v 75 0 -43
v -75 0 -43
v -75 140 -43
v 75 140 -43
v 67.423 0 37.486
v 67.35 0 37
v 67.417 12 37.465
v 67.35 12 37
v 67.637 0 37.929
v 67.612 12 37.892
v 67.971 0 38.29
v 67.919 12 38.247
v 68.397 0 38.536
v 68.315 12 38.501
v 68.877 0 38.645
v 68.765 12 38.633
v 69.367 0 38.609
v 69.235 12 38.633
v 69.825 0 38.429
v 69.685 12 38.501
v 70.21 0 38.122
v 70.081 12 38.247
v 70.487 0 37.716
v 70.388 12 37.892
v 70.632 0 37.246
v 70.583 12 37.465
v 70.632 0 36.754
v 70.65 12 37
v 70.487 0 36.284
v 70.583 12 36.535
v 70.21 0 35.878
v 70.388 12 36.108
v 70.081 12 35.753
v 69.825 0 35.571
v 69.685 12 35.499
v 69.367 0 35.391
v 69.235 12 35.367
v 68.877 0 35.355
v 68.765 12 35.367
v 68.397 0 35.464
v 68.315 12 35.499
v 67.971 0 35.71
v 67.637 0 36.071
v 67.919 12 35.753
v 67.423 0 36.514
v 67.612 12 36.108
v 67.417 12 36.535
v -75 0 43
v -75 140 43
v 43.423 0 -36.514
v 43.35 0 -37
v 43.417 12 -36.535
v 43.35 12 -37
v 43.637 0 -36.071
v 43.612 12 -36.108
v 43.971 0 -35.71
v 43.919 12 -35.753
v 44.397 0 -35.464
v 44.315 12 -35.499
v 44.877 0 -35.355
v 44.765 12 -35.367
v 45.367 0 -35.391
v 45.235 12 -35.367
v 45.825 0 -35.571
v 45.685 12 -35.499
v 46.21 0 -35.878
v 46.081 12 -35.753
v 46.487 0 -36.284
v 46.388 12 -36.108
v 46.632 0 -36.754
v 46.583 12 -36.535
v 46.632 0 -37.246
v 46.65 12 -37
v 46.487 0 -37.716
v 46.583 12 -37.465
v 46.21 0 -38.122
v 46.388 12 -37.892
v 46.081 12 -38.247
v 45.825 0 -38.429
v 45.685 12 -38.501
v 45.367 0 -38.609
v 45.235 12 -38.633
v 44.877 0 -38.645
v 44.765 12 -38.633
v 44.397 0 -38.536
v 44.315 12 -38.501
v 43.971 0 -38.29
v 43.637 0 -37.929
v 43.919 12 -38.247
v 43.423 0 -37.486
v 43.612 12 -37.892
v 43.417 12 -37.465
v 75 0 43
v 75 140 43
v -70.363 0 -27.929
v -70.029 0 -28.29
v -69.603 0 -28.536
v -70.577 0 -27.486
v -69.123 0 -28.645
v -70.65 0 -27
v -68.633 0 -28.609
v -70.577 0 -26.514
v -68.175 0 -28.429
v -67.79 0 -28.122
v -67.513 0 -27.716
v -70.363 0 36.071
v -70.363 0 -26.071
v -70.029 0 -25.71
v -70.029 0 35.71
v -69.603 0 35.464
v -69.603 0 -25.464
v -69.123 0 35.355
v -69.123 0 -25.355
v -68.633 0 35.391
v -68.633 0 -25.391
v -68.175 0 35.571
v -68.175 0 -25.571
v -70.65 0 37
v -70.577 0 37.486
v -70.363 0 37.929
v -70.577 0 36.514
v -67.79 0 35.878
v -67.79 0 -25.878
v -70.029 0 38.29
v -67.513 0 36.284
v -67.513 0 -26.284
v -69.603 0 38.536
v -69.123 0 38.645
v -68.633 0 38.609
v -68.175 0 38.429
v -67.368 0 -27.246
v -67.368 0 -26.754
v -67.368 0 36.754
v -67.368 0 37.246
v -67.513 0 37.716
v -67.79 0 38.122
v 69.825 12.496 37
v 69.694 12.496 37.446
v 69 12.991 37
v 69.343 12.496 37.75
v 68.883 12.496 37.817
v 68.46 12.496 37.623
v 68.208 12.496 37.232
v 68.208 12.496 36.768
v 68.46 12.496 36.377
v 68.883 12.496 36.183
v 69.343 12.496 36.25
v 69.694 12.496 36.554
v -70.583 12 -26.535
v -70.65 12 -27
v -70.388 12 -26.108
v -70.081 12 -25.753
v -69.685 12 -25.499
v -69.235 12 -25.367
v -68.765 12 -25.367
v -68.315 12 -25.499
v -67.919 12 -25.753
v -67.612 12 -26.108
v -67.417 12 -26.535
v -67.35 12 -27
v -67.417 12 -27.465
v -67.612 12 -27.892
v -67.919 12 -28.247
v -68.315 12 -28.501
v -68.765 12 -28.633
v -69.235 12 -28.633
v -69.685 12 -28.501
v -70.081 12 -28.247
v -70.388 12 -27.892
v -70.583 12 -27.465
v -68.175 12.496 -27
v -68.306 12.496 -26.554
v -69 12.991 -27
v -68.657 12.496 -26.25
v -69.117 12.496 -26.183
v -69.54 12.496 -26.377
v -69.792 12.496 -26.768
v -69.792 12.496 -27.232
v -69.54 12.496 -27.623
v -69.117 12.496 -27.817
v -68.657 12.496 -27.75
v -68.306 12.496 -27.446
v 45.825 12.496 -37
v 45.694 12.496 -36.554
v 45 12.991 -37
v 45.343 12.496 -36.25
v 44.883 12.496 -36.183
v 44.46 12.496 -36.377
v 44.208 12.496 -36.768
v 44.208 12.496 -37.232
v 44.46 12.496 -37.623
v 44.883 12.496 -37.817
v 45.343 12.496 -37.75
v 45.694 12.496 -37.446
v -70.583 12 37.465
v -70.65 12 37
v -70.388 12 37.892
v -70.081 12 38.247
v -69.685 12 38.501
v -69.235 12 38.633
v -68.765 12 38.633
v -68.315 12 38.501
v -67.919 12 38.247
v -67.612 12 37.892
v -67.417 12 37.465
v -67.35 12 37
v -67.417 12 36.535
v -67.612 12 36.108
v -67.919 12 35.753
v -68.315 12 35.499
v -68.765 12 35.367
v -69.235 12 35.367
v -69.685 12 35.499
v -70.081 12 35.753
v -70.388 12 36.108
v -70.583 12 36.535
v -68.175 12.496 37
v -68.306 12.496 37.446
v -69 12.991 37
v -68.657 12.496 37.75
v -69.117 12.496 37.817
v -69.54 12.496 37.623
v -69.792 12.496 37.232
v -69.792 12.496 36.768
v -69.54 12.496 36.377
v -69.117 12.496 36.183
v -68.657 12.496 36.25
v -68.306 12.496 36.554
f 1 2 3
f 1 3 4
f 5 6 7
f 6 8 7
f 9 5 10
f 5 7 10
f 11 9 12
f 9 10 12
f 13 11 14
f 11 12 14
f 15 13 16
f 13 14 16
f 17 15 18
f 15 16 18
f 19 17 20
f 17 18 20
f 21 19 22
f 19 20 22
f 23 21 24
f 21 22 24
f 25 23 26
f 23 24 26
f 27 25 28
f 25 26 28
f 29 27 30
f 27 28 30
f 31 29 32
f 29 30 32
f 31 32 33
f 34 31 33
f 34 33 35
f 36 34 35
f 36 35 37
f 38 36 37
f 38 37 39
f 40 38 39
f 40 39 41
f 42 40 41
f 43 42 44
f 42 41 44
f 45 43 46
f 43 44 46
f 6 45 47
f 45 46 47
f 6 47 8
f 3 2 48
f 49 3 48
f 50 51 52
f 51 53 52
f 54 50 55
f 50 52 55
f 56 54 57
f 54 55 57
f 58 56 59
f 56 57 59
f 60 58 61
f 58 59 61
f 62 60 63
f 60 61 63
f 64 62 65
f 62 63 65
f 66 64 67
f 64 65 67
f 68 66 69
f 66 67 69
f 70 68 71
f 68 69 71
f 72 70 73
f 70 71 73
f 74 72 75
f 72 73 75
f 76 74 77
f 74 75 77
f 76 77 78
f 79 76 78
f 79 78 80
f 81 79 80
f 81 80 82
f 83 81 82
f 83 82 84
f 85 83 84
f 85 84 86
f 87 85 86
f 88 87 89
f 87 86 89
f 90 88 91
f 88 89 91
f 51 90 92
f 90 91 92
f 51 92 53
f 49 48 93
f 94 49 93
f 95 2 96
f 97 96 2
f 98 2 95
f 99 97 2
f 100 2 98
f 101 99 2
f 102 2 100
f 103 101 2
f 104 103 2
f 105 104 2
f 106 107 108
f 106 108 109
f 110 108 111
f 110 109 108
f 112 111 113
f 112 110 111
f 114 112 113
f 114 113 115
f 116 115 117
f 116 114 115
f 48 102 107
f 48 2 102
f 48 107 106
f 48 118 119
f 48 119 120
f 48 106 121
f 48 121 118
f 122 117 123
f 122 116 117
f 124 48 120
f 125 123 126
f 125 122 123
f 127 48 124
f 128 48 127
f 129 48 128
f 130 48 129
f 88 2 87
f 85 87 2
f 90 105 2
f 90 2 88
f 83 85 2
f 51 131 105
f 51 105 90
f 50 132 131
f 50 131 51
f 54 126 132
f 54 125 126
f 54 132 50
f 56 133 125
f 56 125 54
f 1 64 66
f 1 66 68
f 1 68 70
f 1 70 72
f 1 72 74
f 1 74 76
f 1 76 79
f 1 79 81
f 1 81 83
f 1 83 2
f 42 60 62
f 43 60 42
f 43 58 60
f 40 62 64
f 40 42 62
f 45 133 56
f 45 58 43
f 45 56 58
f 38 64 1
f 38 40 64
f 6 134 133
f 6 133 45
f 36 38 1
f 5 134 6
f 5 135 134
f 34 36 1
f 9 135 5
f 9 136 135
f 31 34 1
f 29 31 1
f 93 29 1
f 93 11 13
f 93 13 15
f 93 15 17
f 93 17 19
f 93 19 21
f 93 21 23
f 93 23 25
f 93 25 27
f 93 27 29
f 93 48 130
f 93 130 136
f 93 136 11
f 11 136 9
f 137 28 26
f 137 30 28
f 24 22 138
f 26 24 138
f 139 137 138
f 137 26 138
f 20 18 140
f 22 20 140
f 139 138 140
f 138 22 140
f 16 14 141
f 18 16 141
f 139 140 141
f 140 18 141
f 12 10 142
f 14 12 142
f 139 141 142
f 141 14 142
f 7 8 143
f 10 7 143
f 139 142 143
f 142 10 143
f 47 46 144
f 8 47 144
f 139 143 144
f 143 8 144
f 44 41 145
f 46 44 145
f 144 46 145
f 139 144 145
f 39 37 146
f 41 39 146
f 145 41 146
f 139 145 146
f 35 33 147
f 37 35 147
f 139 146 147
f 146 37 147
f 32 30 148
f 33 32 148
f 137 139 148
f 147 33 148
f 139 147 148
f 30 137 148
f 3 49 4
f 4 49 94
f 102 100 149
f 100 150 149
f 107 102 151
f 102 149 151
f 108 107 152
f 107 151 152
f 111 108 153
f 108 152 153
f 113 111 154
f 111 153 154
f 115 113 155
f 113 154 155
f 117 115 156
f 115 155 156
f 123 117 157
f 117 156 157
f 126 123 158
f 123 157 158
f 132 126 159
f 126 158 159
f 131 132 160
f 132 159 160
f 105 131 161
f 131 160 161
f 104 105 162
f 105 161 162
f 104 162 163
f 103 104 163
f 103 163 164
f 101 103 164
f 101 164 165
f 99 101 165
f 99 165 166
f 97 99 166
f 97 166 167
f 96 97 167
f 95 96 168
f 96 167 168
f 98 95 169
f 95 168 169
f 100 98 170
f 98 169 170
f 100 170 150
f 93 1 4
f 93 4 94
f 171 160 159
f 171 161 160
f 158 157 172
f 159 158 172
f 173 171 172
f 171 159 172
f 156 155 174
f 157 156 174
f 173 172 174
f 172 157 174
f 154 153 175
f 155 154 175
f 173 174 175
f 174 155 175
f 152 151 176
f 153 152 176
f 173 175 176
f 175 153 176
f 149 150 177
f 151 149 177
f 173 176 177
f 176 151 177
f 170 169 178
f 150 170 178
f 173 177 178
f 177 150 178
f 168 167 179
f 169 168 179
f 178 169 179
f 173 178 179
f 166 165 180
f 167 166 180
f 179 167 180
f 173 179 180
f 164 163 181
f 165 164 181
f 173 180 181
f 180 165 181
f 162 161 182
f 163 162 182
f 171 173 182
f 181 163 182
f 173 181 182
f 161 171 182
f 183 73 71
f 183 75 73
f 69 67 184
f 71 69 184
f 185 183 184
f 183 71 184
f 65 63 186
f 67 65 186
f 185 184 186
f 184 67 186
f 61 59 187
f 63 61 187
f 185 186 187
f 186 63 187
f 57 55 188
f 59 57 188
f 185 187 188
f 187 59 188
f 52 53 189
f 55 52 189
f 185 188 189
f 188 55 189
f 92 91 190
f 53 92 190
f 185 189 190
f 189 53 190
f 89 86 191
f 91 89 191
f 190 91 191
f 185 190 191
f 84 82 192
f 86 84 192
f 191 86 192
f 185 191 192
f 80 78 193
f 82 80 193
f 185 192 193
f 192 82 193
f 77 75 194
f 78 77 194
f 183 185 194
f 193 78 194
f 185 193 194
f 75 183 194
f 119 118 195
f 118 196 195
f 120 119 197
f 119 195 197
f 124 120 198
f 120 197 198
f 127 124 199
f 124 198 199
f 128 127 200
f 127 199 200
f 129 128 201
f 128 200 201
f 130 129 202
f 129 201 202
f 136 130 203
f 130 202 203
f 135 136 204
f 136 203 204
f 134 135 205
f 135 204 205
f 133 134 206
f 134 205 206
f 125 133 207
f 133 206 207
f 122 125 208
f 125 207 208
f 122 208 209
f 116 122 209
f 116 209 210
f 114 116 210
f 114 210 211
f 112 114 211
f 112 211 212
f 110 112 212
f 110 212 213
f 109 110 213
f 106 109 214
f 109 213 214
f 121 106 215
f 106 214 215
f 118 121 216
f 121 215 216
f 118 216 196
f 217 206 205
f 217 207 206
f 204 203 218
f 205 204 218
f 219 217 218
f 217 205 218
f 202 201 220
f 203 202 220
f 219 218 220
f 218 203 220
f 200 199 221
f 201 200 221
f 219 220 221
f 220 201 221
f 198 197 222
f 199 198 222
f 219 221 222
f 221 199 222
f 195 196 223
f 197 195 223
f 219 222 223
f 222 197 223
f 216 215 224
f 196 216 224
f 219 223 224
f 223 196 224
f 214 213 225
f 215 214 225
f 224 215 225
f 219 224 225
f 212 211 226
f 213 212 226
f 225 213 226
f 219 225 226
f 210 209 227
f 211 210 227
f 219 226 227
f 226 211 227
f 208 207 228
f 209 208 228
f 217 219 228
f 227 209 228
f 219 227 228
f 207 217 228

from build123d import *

# Parameters (mm, degrees)
F0_W     = 150
F0_H     = 86
F1_DEPTH = 140
F2_D     = 3.3
F2_DEPTH = 12
F2_TIP   = 0.9914200214
F3_D     = 3.3
F3_DEPTH = 12
F3_TIP   = 0.9914200214
F4_D     = 3.3
F4_DEPTH = 12
F4_TIP   = 0.9914200214
F5_D     = 3.3
F5_DEPTH = 12
F5_TIP   = 0.9914200214


with BuildPart() as f1:
    # F0 (on Front) → F1 (new body)
    with BuildSketch(Plane.XZ):
        Rectangle(F0_W, F0_H)
    extrude(amount=-F1_DEPTH)

    # F2
    with Locations(Plane.XZ):
        with Locations((-69, 37)):
            Hole(F2_D / 2, depth=F2_DEPTH)
            with Locations((0, 0, -(F2_DEPTH + F2_TIP / 2))):  # 118° drill point
                Cone(0, F2_D / 2, F2_TIP, mode=Mode.SUBTRACT)

    # F3
    with Locations(Plane.XZ):
        with Locations((-69, -27)):
            Hole(F3_D / 2, depth=F3_DEPTH)
            with Locations((0, 0, -(F3_DEPTH + F3_TIP / 2))):  # 118° drill point
                Cone(0, F3_D / 2, F3_TIP, mode=Mode.SUBTRACT)

    # F4
    with Locations(Plane.XZ):
        with Locations((69, 37)):
            Hole(F4_D / 2, depth=F4_DEPTH)
            with Locations((0, 0, -(F4_DEPTH + F4_TIP / 2))):  # 118° drill point
                Cone(0, F4_D / 2, F4_TIP, mode=Mode.SUBTRACT)

    # F5
    with Locations(Plane.XZ):
        with Locations((45, -37)):
            Hole(F5_D / 2, depth=F5_DEPTH)
            with Locations((0, 0, -(F5_DEPTH + F5_TIP / 2))):  # 118° drill point
                Cone(0, F5_D / 2, F5_TIP, mode=Mode.SUBTRACT)


solid = f1.part
